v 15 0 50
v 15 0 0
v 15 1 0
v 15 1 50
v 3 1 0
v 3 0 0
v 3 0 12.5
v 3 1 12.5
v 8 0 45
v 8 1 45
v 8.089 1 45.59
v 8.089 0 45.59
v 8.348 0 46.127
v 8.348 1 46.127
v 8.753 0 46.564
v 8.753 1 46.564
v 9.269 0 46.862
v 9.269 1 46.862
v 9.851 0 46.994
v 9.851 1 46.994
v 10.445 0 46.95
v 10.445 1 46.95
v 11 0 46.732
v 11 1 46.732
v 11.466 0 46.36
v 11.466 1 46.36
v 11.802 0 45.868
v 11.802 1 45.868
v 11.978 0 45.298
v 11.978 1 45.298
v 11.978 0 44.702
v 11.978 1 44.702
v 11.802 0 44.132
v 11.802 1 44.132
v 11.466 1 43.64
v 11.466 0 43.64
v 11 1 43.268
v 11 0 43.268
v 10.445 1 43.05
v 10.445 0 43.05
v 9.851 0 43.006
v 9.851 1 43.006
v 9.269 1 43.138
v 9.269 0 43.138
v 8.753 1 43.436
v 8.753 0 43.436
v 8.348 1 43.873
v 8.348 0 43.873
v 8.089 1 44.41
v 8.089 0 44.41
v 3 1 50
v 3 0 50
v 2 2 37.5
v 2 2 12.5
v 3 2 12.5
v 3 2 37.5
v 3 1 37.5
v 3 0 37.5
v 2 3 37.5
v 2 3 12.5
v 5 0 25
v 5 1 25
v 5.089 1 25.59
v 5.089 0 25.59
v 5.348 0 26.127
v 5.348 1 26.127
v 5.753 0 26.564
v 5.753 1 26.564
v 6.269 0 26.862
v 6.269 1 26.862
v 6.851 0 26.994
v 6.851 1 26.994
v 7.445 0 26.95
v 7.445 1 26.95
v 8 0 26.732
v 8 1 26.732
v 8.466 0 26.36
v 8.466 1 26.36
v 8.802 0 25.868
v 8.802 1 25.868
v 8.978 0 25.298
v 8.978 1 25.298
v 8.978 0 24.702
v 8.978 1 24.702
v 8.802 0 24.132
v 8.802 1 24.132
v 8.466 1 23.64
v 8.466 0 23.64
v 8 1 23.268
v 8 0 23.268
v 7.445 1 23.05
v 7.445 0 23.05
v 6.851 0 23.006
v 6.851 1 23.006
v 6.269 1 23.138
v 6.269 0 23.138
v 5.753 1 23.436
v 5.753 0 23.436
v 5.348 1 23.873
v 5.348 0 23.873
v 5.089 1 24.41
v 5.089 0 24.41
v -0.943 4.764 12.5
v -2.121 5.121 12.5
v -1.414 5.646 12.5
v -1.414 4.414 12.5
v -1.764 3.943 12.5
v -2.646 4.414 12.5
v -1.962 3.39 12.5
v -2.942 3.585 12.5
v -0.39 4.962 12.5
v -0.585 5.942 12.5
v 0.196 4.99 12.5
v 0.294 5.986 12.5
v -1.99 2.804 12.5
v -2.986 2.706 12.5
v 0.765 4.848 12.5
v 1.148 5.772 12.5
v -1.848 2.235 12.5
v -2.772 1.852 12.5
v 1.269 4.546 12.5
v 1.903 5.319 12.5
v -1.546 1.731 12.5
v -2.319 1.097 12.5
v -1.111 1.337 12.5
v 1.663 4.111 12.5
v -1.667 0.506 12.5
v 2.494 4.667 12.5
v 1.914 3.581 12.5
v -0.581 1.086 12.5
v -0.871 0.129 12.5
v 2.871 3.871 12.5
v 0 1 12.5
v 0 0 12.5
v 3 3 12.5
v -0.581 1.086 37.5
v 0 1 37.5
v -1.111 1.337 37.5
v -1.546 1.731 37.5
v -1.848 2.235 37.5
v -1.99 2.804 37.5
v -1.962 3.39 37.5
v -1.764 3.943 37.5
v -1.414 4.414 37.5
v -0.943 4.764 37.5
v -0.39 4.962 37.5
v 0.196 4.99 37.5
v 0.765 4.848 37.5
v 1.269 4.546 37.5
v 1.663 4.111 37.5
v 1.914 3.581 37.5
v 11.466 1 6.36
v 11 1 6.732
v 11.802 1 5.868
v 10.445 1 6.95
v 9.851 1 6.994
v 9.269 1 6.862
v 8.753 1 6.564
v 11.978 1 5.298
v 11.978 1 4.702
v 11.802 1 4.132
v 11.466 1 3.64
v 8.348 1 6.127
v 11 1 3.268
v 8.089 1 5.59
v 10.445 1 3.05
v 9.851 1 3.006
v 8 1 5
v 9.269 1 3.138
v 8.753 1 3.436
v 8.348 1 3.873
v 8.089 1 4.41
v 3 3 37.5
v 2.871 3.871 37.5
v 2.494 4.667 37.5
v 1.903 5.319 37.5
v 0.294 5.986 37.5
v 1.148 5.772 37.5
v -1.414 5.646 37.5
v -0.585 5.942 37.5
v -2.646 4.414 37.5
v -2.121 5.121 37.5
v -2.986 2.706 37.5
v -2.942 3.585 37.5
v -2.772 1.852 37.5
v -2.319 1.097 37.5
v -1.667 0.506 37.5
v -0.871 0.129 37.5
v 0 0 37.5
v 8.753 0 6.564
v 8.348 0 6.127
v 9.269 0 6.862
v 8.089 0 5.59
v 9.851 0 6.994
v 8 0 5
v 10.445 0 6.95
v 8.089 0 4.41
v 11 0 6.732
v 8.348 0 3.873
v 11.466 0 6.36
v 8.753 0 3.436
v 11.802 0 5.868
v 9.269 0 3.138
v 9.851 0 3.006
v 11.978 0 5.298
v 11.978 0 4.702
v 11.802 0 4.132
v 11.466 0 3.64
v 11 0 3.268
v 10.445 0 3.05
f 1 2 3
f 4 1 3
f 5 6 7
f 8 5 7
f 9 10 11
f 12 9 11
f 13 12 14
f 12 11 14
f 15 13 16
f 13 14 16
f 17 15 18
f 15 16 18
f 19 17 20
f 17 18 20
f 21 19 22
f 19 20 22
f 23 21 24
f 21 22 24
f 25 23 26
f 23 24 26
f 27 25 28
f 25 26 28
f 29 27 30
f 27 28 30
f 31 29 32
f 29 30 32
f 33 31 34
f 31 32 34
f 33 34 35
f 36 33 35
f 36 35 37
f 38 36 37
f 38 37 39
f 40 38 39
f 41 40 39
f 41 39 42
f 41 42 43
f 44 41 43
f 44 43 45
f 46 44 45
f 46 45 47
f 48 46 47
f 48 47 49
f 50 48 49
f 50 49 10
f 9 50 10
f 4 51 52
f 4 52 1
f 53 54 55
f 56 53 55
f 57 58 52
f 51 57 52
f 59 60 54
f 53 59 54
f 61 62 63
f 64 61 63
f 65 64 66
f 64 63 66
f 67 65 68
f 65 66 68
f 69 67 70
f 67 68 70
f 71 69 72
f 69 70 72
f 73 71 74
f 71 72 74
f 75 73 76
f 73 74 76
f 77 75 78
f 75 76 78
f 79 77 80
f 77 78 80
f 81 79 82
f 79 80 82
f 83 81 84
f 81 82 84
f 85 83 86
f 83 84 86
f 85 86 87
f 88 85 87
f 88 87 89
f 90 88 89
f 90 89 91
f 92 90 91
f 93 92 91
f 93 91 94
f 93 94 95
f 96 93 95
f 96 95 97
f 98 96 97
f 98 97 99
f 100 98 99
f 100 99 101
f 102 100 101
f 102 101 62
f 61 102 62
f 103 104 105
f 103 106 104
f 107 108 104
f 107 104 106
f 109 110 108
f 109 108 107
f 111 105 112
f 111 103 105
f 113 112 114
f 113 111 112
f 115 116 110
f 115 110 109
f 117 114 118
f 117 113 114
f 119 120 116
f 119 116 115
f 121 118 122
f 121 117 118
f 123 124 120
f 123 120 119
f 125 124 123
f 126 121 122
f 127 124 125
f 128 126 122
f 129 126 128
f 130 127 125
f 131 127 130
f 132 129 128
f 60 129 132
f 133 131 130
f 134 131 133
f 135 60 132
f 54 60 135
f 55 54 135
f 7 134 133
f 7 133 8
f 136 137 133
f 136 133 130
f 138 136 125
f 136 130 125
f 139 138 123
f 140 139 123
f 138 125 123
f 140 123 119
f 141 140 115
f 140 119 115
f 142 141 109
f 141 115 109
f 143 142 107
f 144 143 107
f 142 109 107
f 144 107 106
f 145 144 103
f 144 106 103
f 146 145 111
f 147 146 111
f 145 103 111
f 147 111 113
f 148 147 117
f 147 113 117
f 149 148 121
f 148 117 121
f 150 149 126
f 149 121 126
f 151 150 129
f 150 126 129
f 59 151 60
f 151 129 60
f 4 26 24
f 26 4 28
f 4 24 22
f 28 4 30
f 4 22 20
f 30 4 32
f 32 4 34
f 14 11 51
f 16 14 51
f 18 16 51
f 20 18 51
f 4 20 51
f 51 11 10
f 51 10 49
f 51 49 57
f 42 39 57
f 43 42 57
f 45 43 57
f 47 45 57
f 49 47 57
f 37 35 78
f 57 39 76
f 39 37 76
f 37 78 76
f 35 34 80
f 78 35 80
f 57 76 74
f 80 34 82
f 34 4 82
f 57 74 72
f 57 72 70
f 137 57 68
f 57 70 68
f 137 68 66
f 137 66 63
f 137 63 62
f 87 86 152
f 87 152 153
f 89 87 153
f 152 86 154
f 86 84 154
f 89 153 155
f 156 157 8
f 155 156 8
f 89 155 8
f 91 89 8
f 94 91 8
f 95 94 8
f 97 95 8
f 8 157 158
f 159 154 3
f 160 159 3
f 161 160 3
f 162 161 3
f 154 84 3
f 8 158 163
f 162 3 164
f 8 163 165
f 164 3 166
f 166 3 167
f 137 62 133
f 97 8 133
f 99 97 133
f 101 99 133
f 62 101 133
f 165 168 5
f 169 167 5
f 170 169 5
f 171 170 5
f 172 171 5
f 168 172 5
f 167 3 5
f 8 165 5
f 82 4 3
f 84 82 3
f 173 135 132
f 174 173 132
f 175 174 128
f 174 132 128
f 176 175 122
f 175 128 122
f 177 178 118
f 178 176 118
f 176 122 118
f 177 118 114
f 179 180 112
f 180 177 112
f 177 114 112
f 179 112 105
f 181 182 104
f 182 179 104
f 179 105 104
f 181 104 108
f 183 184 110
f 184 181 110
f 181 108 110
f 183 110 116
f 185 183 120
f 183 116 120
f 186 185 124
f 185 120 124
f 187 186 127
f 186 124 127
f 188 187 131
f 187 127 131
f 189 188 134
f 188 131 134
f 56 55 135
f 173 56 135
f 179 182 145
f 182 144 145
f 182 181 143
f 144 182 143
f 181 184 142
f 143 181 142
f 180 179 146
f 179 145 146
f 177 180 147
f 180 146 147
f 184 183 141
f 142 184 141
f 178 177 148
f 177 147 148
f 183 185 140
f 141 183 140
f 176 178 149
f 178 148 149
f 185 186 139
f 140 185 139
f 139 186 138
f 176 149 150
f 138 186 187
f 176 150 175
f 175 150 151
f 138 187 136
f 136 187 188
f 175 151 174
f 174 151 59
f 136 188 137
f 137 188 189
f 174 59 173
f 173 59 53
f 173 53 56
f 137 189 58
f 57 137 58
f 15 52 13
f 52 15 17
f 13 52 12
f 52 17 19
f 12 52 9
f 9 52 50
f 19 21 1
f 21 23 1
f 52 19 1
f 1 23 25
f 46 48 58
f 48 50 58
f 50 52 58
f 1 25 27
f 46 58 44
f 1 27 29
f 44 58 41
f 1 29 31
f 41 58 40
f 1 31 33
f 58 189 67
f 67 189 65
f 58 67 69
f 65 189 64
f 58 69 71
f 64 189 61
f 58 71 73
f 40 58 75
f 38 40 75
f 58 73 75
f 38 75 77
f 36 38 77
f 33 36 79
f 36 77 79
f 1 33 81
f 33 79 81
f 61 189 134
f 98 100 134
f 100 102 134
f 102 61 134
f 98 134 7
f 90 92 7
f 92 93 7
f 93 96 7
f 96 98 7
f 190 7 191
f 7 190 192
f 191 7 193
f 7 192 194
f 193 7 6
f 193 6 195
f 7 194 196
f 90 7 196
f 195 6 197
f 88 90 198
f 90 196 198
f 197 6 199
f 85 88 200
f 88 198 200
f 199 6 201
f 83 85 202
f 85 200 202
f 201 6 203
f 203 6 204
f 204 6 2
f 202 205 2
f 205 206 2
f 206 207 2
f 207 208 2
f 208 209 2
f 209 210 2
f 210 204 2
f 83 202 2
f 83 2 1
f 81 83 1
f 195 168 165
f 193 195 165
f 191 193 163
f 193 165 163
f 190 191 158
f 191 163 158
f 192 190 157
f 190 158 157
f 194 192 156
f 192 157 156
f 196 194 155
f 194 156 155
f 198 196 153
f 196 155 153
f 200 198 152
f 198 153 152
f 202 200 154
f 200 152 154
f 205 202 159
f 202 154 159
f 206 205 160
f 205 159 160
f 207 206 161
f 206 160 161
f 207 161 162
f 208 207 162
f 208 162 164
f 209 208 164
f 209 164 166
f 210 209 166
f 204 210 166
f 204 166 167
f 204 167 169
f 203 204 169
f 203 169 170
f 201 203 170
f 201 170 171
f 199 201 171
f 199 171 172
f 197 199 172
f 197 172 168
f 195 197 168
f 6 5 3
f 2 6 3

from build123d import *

# Parameters (mm, degrees)
F1_DEPTH = 50
F3_D     = 4
F3_DEPTH = 10
F2_W     = 8
F2_H     = 12.5
F4_DEPTH = 25


with BuildPart() as f1:
    # F0 (on Top) → F1 (new body)
    with BuildSketch(Plane.XY):
        with BuildLine():
            Line((15, 1), (0, 1))
            ThreePointArc((0, 1), (-1.414214, 4.414214), (2, 3))
            Line((2, 3), (2, 2))
            Line((2, 2), (3, 2))
            Line((3, 2), (3, 3))
            ThreePointArc((3, 3), (-2.12132, 5.12132), (0, 0))
            Line((0, 0), (15, 0))
            Line((15, 0), (15, 1))
        make_face()
    extrude(amount=F1_DEPTH)

    # F3
    with Locations(Plane.XZ):
        with Locations((10, 45), (7, 25), (10, 5)):
            Hole(F3_D / 2, depth=F3_DEPTH)

    # F2 (on Front) → F4 (cut)
    with BuildSketch(Plane.XZ):
        with Locations((-1, 43.75)):
            Rectangle(F2_W, F2_H)
        with Locations((-1, 6.25)):
            Rectangle(F2_W, F2_H)
    extrude(amount=-F4_DEPTH, mode=Mode.SUBTRACT)


solid = f1.part
